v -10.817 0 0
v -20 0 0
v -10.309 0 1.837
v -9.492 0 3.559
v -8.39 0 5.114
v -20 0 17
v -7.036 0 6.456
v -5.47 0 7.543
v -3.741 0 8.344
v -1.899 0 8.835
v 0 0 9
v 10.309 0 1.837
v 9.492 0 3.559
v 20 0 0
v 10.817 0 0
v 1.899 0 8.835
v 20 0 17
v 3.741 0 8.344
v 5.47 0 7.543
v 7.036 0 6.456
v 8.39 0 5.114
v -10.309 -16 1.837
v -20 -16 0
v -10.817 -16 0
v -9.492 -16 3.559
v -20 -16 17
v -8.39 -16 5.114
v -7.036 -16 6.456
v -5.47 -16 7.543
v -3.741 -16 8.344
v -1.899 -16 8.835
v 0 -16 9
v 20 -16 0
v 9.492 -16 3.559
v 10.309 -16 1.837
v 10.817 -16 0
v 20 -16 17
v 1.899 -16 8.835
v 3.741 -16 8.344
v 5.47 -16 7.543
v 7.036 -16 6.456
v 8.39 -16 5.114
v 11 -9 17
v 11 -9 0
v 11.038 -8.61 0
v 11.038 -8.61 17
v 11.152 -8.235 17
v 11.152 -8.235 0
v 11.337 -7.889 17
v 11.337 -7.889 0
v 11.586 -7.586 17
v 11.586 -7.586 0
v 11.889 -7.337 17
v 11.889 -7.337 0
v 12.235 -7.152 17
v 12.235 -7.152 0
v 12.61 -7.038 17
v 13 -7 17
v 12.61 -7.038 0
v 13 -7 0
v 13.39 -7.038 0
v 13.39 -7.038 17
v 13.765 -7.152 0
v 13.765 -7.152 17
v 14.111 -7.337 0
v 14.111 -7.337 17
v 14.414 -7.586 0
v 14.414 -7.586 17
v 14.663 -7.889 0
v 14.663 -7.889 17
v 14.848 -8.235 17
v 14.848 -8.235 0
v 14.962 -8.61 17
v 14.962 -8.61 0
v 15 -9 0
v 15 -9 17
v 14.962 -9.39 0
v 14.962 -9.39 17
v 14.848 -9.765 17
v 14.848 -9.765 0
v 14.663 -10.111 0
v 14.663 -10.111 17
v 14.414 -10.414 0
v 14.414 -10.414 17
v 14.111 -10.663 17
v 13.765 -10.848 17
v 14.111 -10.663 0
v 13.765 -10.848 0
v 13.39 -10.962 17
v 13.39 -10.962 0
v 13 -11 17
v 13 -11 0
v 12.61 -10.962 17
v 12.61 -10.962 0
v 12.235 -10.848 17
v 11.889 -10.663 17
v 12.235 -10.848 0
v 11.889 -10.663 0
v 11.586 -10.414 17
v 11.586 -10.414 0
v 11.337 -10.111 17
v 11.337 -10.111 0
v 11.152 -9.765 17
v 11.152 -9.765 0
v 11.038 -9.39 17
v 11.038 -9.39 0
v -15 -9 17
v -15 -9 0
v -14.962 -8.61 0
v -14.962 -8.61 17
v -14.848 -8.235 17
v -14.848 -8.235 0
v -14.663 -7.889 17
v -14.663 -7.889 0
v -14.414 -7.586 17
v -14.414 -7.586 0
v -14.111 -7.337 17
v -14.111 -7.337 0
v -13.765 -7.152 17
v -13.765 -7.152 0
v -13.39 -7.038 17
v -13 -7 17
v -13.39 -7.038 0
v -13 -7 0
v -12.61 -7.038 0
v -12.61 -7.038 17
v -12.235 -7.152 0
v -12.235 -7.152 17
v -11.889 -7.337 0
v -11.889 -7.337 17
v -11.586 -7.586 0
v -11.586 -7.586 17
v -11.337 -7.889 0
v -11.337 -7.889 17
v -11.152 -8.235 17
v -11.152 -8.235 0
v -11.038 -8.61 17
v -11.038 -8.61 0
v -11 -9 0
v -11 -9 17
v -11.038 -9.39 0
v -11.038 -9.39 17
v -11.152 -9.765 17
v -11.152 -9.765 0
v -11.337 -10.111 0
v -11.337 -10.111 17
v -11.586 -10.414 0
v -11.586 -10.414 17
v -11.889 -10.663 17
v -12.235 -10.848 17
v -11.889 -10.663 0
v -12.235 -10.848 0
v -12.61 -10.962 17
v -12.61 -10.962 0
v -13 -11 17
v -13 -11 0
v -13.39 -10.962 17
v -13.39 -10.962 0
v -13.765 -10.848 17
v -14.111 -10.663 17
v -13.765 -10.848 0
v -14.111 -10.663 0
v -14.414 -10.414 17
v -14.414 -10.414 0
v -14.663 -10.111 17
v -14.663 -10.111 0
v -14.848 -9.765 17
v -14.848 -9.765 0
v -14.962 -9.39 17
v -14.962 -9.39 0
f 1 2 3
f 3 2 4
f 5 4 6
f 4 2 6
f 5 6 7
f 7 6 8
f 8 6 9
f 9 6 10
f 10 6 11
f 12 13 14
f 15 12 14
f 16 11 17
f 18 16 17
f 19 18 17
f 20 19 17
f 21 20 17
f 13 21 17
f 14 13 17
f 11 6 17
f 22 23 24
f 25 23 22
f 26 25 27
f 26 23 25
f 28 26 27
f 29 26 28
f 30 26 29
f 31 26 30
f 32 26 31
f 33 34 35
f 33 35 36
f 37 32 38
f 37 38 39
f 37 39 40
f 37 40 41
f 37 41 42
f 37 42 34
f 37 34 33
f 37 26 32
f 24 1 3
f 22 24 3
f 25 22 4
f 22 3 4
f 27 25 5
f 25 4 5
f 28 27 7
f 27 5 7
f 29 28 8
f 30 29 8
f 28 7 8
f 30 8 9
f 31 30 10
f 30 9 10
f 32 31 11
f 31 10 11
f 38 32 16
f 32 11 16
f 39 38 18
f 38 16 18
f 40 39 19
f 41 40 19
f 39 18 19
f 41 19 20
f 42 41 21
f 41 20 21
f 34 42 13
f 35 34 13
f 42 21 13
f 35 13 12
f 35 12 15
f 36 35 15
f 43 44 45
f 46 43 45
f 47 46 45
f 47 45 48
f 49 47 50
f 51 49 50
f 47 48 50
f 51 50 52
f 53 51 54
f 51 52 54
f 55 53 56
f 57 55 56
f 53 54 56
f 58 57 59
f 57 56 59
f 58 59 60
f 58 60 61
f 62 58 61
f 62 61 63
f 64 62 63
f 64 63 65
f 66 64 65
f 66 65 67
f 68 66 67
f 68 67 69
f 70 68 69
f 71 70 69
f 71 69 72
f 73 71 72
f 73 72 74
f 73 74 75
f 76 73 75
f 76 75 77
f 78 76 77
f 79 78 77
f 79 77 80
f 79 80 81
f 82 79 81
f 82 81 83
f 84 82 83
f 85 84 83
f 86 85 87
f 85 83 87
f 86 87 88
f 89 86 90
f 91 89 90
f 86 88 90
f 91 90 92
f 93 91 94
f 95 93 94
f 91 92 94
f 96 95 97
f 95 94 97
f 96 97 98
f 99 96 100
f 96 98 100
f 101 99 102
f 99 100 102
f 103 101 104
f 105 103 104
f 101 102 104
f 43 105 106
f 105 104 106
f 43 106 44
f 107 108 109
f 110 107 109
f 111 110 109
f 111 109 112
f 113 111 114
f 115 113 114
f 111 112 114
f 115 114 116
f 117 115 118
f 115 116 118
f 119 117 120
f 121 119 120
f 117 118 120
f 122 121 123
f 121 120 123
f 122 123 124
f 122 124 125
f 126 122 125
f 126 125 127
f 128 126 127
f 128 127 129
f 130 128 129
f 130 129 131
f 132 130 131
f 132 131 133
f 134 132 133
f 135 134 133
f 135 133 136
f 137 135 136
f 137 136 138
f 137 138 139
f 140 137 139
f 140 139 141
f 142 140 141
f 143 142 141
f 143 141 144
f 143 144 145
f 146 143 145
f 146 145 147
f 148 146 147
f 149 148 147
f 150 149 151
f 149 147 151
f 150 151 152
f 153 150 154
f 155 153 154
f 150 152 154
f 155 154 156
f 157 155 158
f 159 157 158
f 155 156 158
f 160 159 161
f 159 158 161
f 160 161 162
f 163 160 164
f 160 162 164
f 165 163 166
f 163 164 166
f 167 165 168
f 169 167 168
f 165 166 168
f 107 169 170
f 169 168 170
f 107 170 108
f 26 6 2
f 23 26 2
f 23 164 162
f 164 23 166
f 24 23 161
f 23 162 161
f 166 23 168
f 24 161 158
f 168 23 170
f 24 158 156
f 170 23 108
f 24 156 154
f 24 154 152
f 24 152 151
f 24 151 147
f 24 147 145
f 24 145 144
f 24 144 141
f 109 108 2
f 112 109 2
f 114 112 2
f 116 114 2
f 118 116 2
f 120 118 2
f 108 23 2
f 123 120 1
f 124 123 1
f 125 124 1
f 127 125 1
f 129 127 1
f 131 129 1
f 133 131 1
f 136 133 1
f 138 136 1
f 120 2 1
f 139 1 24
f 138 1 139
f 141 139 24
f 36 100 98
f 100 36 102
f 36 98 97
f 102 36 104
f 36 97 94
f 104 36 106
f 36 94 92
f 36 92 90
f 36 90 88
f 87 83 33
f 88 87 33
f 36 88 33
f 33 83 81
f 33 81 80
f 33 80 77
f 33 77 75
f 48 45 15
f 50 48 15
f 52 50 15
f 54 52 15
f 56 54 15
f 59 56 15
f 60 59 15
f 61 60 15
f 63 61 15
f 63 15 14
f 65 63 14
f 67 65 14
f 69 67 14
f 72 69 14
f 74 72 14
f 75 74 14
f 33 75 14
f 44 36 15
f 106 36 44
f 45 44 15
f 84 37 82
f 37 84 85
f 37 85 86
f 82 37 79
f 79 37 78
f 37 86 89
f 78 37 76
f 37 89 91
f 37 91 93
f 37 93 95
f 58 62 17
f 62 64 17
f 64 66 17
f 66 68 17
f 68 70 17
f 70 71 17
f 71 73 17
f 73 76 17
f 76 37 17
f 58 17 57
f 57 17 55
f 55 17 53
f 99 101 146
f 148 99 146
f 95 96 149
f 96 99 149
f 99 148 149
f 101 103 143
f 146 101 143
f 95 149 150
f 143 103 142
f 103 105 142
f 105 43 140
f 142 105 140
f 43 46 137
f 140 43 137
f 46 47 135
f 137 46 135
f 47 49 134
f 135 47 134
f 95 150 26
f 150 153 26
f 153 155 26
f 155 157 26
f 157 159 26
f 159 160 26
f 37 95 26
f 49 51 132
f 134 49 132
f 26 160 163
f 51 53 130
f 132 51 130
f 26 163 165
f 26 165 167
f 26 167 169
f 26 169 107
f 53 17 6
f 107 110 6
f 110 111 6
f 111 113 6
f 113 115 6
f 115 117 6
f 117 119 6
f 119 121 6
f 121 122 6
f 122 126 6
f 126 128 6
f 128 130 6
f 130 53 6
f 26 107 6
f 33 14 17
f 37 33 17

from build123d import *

# Parameters (mm, degrees)
F1_DEPTH = 16
F3_D     = 4


# Not quite as in the source:
# - a feature of the source that left no trace in its solid (it failed there, or was rolled back) is left out
# - the program builds the solid bodies; features that only make, move or delete a surface that nothing else refers to are left out


with BuildPart() as f1:
    # F0 (on Front) → F1 (new body)
    with BuildSketch(Plane.XZ):
        with BuildLine():
            ThreePointArc((-10.8166538264, 0), (0, 9), (10.8166538264, 0))
            Line((10.8166538264, 0), (20, 0))
            Line((20, 0), (20, 17))
            Line((20, 17), (-20, 17))
            Line((-20, 17), (-20, 0))
            Line((-20, 0), (-10.8166538264, 0))
        make_face()
    extrude(amount=F1_DEPTH)

    # F3 (through all)
    with Locations(Plane.XY.offset(17)):
        with Locations((13, -9), (-13, -9)):
            Hole(F3_D / 2)


solid = f1.part
